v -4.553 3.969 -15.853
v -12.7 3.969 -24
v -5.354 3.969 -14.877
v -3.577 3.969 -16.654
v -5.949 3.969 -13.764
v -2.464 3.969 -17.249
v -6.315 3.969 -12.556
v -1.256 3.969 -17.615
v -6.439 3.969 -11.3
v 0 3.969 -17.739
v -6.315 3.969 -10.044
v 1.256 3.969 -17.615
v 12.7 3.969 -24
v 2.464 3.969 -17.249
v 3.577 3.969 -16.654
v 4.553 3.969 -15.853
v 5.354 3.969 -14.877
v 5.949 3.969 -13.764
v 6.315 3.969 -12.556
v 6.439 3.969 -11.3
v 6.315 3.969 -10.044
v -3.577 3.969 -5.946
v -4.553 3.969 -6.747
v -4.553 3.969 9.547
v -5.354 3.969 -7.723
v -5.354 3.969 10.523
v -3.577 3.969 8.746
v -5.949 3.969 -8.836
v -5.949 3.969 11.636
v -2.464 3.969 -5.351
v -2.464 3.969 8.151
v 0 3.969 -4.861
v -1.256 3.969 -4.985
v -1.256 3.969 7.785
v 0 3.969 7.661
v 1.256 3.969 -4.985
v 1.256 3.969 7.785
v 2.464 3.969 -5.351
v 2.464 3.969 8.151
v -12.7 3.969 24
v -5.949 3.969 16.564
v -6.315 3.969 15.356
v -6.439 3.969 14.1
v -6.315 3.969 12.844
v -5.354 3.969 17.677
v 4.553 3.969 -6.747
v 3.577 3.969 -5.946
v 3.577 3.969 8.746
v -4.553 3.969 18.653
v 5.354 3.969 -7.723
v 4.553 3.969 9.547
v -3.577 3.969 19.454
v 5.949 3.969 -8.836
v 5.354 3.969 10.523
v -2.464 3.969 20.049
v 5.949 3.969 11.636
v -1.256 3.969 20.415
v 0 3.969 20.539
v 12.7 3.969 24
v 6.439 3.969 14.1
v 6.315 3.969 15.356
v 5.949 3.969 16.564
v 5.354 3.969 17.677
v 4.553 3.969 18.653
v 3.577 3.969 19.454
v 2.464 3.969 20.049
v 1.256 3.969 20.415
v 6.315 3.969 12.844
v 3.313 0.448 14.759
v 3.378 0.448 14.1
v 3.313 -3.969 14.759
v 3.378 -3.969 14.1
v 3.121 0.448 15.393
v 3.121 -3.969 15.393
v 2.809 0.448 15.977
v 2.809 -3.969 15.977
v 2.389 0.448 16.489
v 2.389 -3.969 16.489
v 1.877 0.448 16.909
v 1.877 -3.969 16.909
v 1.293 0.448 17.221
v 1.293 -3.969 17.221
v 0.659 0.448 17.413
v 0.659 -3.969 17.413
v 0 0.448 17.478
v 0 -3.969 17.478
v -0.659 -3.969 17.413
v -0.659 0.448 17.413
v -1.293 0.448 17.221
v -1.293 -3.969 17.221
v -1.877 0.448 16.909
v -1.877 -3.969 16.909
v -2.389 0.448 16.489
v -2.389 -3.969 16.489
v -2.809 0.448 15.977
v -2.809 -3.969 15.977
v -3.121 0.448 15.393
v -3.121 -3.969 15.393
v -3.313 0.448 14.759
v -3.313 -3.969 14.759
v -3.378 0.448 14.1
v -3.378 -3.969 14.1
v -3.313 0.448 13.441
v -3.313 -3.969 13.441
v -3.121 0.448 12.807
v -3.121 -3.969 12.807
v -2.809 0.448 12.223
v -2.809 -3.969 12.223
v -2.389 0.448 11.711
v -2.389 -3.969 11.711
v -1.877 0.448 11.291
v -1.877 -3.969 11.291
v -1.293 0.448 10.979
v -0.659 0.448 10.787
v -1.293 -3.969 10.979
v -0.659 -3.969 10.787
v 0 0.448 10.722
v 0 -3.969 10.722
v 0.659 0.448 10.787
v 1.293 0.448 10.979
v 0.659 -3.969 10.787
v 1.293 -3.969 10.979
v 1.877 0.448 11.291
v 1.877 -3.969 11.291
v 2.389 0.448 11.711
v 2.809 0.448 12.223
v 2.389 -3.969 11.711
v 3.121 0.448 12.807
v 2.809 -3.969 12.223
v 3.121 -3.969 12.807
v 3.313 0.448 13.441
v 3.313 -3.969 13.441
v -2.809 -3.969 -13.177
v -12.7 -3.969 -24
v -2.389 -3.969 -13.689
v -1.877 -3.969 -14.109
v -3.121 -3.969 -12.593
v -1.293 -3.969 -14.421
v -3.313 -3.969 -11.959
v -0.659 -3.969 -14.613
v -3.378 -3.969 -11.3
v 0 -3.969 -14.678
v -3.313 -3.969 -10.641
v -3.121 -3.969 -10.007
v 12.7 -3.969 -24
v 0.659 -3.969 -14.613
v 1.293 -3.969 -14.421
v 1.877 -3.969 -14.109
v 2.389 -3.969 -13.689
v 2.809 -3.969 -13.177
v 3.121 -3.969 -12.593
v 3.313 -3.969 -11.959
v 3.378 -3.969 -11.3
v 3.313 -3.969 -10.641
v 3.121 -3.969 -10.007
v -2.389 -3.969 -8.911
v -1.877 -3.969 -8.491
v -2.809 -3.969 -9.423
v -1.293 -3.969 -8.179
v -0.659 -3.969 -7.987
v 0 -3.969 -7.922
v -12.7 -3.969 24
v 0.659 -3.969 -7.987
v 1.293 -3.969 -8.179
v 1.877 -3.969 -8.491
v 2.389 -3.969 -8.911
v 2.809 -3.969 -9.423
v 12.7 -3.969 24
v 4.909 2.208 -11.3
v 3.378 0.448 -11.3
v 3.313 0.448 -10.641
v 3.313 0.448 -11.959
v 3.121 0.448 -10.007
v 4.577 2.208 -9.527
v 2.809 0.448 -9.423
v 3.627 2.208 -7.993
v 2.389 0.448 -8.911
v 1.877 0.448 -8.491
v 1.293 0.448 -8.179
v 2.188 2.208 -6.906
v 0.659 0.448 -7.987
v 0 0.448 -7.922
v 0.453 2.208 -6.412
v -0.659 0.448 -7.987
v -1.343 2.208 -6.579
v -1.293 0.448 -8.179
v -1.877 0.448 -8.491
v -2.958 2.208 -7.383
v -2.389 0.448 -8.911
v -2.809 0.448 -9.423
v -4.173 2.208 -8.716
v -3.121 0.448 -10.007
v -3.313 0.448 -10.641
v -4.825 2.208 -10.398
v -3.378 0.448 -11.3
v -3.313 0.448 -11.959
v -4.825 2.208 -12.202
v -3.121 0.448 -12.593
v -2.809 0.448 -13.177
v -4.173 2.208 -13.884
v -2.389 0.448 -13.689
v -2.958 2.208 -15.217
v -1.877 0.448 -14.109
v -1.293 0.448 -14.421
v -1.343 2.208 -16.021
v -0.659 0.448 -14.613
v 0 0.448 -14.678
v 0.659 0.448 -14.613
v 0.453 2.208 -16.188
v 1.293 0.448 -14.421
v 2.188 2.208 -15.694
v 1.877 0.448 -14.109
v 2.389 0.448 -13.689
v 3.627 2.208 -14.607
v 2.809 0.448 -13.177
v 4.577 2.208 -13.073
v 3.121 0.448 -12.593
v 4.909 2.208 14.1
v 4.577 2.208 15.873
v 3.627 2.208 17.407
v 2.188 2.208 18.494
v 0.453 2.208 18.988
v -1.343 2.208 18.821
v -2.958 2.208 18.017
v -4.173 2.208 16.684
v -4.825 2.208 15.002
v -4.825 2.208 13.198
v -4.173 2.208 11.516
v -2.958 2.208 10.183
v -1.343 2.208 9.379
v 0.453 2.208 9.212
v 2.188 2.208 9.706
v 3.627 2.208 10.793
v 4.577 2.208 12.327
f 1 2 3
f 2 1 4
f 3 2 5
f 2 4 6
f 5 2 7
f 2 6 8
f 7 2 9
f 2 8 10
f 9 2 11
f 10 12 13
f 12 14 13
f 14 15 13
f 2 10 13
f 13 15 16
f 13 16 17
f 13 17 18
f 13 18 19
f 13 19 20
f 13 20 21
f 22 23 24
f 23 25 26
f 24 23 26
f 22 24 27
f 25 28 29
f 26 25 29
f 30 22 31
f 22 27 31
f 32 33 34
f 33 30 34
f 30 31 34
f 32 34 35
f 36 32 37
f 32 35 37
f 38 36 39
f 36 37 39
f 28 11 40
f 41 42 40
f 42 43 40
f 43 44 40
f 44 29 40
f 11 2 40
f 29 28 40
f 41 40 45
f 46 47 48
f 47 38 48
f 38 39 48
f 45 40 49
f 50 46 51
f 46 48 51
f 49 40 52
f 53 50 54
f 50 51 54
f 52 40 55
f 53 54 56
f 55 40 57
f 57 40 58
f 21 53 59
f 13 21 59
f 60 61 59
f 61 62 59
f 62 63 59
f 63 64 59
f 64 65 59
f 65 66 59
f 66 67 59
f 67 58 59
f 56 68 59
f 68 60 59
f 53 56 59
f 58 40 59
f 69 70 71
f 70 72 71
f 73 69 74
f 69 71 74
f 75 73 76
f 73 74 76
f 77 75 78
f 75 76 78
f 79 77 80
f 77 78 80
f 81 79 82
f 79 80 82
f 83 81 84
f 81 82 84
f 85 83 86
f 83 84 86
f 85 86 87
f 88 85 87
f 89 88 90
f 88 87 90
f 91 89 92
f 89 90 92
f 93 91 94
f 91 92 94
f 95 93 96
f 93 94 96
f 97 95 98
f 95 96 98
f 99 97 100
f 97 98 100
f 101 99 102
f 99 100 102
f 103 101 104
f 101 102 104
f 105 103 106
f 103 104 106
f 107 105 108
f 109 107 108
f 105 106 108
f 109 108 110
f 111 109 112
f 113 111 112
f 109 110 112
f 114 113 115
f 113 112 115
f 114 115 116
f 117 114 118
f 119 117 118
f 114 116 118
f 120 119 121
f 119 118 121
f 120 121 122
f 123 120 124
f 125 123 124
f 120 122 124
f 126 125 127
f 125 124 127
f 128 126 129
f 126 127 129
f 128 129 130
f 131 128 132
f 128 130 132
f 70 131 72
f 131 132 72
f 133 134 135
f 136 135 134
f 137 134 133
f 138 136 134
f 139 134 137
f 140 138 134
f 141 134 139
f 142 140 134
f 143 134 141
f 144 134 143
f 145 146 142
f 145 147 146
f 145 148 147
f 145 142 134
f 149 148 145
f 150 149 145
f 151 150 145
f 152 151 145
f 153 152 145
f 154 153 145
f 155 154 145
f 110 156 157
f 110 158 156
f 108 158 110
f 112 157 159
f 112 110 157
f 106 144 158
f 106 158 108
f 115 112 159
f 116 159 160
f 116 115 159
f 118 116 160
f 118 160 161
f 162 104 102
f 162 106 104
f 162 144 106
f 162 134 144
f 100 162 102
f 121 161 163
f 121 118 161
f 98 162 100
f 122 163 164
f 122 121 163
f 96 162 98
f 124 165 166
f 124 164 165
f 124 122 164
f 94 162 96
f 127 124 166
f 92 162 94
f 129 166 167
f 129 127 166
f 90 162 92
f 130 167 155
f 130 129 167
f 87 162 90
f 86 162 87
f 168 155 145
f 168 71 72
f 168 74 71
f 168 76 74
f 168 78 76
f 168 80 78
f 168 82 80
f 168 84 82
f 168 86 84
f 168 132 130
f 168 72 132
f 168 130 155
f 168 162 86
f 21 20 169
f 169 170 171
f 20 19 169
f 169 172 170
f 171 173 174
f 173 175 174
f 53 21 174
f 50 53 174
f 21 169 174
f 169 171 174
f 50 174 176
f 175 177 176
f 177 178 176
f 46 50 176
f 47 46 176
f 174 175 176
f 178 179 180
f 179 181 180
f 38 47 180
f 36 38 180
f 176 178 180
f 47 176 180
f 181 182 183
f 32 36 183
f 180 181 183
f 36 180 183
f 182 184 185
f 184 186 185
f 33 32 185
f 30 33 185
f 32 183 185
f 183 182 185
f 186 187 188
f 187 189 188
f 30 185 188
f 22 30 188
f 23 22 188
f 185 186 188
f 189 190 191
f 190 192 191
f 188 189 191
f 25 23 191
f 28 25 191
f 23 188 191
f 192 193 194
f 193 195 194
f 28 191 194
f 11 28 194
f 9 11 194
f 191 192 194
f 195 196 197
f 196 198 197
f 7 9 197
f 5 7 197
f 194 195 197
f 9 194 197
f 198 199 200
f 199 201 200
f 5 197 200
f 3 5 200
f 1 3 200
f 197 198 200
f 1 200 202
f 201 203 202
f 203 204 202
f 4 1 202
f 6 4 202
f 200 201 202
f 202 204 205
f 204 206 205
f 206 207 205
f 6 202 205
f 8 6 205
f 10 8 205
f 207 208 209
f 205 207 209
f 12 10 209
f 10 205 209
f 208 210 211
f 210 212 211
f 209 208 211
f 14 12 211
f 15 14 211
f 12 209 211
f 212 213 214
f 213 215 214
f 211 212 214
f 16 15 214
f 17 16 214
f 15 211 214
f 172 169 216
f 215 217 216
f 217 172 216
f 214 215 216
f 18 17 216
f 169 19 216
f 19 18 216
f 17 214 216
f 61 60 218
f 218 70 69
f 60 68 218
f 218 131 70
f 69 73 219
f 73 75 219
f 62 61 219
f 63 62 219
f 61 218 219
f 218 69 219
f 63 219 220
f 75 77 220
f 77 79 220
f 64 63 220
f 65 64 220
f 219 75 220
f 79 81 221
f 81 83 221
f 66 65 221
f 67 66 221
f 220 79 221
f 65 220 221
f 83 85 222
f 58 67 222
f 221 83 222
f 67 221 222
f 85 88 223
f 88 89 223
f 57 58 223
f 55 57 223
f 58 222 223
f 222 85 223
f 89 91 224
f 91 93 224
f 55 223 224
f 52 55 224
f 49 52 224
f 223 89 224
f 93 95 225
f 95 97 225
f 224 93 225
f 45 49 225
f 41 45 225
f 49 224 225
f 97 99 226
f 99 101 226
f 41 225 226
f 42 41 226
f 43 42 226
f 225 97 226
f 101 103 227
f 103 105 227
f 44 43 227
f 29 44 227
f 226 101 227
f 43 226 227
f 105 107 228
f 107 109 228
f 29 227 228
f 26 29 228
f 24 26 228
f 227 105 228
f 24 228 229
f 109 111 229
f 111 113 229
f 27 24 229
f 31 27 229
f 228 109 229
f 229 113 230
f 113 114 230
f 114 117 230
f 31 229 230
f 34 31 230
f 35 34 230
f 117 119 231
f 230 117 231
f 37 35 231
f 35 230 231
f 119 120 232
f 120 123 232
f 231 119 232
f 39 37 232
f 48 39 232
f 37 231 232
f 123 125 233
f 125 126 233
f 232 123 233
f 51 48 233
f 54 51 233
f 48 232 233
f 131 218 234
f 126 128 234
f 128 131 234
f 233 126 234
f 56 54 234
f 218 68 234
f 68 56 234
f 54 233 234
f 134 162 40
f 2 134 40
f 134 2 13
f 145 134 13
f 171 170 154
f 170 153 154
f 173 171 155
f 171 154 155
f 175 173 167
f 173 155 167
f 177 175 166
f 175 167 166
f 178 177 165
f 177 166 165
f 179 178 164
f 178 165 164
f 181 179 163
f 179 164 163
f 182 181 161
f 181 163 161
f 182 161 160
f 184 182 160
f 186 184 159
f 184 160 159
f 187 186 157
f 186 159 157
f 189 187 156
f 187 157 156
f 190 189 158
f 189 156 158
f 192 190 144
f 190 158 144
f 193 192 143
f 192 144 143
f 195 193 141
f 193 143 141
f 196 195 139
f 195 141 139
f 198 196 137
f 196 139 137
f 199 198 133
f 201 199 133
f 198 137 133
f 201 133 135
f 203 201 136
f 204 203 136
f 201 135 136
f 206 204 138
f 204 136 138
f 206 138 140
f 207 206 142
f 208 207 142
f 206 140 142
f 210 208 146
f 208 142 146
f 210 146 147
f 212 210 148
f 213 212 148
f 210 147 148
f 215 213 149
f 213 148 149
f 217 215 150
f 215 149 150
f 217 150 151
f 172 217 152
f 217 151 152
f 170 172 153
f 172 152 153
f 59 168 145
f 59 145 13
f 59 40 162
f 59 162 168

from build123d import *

# Parameters (mm, degrees)
SKETCH3_W                                        = 25.4
SKETCH3_H                                        = 7.9375
BOSS_EXTRUDE1_DEPTH                              = 24
CSK_FOR_1_4_FLAT_HEAD_MACHINE_SCREW1_D           = 6.7564
CSK_FOR_1_4_FLAT_HEAD_MACHINE_SCREW1_CSINK_D     = 12.8778
CSK_FOR_1_4_FLAT_HEAD_MACHINE_SCREW1_CSINK_ANGLE = 82


with BuildPart() as part:
    # Sketch3 → Boss-Extrude1 (new body, symmetric)
    with BuildSketch(Plane.XY):
        Rectangle(SKETCH3_W, SKETCH3_H)
    extrude(amount=BOSS_EXTRUDE1_DEPTH, both=True)

    # CSK for 1/4 Flat Head Machine Screw1 (through all)
    with Locations(Plane(origin=(0, 3.96875, 0), x_dir=(-1, 0, 0), z_dir=(0, 1, 0))):
        with Locations((0, 14.1), (0, -11.3)):
            CounterSinkHole(CSK_FOR_1_4_FLAT_HEAD_MACHINE_SCREW1_D / 2, CSK_FOR_1_4_FLAT_HEAD_MACHINE_SCREW1_CSINK_D / 2, counter_sink_angle=CSK_FOR_1_4_FLAT_HEAD_MACHINE_SCREW1_CSINK_ANGLE)


solid = part.part
